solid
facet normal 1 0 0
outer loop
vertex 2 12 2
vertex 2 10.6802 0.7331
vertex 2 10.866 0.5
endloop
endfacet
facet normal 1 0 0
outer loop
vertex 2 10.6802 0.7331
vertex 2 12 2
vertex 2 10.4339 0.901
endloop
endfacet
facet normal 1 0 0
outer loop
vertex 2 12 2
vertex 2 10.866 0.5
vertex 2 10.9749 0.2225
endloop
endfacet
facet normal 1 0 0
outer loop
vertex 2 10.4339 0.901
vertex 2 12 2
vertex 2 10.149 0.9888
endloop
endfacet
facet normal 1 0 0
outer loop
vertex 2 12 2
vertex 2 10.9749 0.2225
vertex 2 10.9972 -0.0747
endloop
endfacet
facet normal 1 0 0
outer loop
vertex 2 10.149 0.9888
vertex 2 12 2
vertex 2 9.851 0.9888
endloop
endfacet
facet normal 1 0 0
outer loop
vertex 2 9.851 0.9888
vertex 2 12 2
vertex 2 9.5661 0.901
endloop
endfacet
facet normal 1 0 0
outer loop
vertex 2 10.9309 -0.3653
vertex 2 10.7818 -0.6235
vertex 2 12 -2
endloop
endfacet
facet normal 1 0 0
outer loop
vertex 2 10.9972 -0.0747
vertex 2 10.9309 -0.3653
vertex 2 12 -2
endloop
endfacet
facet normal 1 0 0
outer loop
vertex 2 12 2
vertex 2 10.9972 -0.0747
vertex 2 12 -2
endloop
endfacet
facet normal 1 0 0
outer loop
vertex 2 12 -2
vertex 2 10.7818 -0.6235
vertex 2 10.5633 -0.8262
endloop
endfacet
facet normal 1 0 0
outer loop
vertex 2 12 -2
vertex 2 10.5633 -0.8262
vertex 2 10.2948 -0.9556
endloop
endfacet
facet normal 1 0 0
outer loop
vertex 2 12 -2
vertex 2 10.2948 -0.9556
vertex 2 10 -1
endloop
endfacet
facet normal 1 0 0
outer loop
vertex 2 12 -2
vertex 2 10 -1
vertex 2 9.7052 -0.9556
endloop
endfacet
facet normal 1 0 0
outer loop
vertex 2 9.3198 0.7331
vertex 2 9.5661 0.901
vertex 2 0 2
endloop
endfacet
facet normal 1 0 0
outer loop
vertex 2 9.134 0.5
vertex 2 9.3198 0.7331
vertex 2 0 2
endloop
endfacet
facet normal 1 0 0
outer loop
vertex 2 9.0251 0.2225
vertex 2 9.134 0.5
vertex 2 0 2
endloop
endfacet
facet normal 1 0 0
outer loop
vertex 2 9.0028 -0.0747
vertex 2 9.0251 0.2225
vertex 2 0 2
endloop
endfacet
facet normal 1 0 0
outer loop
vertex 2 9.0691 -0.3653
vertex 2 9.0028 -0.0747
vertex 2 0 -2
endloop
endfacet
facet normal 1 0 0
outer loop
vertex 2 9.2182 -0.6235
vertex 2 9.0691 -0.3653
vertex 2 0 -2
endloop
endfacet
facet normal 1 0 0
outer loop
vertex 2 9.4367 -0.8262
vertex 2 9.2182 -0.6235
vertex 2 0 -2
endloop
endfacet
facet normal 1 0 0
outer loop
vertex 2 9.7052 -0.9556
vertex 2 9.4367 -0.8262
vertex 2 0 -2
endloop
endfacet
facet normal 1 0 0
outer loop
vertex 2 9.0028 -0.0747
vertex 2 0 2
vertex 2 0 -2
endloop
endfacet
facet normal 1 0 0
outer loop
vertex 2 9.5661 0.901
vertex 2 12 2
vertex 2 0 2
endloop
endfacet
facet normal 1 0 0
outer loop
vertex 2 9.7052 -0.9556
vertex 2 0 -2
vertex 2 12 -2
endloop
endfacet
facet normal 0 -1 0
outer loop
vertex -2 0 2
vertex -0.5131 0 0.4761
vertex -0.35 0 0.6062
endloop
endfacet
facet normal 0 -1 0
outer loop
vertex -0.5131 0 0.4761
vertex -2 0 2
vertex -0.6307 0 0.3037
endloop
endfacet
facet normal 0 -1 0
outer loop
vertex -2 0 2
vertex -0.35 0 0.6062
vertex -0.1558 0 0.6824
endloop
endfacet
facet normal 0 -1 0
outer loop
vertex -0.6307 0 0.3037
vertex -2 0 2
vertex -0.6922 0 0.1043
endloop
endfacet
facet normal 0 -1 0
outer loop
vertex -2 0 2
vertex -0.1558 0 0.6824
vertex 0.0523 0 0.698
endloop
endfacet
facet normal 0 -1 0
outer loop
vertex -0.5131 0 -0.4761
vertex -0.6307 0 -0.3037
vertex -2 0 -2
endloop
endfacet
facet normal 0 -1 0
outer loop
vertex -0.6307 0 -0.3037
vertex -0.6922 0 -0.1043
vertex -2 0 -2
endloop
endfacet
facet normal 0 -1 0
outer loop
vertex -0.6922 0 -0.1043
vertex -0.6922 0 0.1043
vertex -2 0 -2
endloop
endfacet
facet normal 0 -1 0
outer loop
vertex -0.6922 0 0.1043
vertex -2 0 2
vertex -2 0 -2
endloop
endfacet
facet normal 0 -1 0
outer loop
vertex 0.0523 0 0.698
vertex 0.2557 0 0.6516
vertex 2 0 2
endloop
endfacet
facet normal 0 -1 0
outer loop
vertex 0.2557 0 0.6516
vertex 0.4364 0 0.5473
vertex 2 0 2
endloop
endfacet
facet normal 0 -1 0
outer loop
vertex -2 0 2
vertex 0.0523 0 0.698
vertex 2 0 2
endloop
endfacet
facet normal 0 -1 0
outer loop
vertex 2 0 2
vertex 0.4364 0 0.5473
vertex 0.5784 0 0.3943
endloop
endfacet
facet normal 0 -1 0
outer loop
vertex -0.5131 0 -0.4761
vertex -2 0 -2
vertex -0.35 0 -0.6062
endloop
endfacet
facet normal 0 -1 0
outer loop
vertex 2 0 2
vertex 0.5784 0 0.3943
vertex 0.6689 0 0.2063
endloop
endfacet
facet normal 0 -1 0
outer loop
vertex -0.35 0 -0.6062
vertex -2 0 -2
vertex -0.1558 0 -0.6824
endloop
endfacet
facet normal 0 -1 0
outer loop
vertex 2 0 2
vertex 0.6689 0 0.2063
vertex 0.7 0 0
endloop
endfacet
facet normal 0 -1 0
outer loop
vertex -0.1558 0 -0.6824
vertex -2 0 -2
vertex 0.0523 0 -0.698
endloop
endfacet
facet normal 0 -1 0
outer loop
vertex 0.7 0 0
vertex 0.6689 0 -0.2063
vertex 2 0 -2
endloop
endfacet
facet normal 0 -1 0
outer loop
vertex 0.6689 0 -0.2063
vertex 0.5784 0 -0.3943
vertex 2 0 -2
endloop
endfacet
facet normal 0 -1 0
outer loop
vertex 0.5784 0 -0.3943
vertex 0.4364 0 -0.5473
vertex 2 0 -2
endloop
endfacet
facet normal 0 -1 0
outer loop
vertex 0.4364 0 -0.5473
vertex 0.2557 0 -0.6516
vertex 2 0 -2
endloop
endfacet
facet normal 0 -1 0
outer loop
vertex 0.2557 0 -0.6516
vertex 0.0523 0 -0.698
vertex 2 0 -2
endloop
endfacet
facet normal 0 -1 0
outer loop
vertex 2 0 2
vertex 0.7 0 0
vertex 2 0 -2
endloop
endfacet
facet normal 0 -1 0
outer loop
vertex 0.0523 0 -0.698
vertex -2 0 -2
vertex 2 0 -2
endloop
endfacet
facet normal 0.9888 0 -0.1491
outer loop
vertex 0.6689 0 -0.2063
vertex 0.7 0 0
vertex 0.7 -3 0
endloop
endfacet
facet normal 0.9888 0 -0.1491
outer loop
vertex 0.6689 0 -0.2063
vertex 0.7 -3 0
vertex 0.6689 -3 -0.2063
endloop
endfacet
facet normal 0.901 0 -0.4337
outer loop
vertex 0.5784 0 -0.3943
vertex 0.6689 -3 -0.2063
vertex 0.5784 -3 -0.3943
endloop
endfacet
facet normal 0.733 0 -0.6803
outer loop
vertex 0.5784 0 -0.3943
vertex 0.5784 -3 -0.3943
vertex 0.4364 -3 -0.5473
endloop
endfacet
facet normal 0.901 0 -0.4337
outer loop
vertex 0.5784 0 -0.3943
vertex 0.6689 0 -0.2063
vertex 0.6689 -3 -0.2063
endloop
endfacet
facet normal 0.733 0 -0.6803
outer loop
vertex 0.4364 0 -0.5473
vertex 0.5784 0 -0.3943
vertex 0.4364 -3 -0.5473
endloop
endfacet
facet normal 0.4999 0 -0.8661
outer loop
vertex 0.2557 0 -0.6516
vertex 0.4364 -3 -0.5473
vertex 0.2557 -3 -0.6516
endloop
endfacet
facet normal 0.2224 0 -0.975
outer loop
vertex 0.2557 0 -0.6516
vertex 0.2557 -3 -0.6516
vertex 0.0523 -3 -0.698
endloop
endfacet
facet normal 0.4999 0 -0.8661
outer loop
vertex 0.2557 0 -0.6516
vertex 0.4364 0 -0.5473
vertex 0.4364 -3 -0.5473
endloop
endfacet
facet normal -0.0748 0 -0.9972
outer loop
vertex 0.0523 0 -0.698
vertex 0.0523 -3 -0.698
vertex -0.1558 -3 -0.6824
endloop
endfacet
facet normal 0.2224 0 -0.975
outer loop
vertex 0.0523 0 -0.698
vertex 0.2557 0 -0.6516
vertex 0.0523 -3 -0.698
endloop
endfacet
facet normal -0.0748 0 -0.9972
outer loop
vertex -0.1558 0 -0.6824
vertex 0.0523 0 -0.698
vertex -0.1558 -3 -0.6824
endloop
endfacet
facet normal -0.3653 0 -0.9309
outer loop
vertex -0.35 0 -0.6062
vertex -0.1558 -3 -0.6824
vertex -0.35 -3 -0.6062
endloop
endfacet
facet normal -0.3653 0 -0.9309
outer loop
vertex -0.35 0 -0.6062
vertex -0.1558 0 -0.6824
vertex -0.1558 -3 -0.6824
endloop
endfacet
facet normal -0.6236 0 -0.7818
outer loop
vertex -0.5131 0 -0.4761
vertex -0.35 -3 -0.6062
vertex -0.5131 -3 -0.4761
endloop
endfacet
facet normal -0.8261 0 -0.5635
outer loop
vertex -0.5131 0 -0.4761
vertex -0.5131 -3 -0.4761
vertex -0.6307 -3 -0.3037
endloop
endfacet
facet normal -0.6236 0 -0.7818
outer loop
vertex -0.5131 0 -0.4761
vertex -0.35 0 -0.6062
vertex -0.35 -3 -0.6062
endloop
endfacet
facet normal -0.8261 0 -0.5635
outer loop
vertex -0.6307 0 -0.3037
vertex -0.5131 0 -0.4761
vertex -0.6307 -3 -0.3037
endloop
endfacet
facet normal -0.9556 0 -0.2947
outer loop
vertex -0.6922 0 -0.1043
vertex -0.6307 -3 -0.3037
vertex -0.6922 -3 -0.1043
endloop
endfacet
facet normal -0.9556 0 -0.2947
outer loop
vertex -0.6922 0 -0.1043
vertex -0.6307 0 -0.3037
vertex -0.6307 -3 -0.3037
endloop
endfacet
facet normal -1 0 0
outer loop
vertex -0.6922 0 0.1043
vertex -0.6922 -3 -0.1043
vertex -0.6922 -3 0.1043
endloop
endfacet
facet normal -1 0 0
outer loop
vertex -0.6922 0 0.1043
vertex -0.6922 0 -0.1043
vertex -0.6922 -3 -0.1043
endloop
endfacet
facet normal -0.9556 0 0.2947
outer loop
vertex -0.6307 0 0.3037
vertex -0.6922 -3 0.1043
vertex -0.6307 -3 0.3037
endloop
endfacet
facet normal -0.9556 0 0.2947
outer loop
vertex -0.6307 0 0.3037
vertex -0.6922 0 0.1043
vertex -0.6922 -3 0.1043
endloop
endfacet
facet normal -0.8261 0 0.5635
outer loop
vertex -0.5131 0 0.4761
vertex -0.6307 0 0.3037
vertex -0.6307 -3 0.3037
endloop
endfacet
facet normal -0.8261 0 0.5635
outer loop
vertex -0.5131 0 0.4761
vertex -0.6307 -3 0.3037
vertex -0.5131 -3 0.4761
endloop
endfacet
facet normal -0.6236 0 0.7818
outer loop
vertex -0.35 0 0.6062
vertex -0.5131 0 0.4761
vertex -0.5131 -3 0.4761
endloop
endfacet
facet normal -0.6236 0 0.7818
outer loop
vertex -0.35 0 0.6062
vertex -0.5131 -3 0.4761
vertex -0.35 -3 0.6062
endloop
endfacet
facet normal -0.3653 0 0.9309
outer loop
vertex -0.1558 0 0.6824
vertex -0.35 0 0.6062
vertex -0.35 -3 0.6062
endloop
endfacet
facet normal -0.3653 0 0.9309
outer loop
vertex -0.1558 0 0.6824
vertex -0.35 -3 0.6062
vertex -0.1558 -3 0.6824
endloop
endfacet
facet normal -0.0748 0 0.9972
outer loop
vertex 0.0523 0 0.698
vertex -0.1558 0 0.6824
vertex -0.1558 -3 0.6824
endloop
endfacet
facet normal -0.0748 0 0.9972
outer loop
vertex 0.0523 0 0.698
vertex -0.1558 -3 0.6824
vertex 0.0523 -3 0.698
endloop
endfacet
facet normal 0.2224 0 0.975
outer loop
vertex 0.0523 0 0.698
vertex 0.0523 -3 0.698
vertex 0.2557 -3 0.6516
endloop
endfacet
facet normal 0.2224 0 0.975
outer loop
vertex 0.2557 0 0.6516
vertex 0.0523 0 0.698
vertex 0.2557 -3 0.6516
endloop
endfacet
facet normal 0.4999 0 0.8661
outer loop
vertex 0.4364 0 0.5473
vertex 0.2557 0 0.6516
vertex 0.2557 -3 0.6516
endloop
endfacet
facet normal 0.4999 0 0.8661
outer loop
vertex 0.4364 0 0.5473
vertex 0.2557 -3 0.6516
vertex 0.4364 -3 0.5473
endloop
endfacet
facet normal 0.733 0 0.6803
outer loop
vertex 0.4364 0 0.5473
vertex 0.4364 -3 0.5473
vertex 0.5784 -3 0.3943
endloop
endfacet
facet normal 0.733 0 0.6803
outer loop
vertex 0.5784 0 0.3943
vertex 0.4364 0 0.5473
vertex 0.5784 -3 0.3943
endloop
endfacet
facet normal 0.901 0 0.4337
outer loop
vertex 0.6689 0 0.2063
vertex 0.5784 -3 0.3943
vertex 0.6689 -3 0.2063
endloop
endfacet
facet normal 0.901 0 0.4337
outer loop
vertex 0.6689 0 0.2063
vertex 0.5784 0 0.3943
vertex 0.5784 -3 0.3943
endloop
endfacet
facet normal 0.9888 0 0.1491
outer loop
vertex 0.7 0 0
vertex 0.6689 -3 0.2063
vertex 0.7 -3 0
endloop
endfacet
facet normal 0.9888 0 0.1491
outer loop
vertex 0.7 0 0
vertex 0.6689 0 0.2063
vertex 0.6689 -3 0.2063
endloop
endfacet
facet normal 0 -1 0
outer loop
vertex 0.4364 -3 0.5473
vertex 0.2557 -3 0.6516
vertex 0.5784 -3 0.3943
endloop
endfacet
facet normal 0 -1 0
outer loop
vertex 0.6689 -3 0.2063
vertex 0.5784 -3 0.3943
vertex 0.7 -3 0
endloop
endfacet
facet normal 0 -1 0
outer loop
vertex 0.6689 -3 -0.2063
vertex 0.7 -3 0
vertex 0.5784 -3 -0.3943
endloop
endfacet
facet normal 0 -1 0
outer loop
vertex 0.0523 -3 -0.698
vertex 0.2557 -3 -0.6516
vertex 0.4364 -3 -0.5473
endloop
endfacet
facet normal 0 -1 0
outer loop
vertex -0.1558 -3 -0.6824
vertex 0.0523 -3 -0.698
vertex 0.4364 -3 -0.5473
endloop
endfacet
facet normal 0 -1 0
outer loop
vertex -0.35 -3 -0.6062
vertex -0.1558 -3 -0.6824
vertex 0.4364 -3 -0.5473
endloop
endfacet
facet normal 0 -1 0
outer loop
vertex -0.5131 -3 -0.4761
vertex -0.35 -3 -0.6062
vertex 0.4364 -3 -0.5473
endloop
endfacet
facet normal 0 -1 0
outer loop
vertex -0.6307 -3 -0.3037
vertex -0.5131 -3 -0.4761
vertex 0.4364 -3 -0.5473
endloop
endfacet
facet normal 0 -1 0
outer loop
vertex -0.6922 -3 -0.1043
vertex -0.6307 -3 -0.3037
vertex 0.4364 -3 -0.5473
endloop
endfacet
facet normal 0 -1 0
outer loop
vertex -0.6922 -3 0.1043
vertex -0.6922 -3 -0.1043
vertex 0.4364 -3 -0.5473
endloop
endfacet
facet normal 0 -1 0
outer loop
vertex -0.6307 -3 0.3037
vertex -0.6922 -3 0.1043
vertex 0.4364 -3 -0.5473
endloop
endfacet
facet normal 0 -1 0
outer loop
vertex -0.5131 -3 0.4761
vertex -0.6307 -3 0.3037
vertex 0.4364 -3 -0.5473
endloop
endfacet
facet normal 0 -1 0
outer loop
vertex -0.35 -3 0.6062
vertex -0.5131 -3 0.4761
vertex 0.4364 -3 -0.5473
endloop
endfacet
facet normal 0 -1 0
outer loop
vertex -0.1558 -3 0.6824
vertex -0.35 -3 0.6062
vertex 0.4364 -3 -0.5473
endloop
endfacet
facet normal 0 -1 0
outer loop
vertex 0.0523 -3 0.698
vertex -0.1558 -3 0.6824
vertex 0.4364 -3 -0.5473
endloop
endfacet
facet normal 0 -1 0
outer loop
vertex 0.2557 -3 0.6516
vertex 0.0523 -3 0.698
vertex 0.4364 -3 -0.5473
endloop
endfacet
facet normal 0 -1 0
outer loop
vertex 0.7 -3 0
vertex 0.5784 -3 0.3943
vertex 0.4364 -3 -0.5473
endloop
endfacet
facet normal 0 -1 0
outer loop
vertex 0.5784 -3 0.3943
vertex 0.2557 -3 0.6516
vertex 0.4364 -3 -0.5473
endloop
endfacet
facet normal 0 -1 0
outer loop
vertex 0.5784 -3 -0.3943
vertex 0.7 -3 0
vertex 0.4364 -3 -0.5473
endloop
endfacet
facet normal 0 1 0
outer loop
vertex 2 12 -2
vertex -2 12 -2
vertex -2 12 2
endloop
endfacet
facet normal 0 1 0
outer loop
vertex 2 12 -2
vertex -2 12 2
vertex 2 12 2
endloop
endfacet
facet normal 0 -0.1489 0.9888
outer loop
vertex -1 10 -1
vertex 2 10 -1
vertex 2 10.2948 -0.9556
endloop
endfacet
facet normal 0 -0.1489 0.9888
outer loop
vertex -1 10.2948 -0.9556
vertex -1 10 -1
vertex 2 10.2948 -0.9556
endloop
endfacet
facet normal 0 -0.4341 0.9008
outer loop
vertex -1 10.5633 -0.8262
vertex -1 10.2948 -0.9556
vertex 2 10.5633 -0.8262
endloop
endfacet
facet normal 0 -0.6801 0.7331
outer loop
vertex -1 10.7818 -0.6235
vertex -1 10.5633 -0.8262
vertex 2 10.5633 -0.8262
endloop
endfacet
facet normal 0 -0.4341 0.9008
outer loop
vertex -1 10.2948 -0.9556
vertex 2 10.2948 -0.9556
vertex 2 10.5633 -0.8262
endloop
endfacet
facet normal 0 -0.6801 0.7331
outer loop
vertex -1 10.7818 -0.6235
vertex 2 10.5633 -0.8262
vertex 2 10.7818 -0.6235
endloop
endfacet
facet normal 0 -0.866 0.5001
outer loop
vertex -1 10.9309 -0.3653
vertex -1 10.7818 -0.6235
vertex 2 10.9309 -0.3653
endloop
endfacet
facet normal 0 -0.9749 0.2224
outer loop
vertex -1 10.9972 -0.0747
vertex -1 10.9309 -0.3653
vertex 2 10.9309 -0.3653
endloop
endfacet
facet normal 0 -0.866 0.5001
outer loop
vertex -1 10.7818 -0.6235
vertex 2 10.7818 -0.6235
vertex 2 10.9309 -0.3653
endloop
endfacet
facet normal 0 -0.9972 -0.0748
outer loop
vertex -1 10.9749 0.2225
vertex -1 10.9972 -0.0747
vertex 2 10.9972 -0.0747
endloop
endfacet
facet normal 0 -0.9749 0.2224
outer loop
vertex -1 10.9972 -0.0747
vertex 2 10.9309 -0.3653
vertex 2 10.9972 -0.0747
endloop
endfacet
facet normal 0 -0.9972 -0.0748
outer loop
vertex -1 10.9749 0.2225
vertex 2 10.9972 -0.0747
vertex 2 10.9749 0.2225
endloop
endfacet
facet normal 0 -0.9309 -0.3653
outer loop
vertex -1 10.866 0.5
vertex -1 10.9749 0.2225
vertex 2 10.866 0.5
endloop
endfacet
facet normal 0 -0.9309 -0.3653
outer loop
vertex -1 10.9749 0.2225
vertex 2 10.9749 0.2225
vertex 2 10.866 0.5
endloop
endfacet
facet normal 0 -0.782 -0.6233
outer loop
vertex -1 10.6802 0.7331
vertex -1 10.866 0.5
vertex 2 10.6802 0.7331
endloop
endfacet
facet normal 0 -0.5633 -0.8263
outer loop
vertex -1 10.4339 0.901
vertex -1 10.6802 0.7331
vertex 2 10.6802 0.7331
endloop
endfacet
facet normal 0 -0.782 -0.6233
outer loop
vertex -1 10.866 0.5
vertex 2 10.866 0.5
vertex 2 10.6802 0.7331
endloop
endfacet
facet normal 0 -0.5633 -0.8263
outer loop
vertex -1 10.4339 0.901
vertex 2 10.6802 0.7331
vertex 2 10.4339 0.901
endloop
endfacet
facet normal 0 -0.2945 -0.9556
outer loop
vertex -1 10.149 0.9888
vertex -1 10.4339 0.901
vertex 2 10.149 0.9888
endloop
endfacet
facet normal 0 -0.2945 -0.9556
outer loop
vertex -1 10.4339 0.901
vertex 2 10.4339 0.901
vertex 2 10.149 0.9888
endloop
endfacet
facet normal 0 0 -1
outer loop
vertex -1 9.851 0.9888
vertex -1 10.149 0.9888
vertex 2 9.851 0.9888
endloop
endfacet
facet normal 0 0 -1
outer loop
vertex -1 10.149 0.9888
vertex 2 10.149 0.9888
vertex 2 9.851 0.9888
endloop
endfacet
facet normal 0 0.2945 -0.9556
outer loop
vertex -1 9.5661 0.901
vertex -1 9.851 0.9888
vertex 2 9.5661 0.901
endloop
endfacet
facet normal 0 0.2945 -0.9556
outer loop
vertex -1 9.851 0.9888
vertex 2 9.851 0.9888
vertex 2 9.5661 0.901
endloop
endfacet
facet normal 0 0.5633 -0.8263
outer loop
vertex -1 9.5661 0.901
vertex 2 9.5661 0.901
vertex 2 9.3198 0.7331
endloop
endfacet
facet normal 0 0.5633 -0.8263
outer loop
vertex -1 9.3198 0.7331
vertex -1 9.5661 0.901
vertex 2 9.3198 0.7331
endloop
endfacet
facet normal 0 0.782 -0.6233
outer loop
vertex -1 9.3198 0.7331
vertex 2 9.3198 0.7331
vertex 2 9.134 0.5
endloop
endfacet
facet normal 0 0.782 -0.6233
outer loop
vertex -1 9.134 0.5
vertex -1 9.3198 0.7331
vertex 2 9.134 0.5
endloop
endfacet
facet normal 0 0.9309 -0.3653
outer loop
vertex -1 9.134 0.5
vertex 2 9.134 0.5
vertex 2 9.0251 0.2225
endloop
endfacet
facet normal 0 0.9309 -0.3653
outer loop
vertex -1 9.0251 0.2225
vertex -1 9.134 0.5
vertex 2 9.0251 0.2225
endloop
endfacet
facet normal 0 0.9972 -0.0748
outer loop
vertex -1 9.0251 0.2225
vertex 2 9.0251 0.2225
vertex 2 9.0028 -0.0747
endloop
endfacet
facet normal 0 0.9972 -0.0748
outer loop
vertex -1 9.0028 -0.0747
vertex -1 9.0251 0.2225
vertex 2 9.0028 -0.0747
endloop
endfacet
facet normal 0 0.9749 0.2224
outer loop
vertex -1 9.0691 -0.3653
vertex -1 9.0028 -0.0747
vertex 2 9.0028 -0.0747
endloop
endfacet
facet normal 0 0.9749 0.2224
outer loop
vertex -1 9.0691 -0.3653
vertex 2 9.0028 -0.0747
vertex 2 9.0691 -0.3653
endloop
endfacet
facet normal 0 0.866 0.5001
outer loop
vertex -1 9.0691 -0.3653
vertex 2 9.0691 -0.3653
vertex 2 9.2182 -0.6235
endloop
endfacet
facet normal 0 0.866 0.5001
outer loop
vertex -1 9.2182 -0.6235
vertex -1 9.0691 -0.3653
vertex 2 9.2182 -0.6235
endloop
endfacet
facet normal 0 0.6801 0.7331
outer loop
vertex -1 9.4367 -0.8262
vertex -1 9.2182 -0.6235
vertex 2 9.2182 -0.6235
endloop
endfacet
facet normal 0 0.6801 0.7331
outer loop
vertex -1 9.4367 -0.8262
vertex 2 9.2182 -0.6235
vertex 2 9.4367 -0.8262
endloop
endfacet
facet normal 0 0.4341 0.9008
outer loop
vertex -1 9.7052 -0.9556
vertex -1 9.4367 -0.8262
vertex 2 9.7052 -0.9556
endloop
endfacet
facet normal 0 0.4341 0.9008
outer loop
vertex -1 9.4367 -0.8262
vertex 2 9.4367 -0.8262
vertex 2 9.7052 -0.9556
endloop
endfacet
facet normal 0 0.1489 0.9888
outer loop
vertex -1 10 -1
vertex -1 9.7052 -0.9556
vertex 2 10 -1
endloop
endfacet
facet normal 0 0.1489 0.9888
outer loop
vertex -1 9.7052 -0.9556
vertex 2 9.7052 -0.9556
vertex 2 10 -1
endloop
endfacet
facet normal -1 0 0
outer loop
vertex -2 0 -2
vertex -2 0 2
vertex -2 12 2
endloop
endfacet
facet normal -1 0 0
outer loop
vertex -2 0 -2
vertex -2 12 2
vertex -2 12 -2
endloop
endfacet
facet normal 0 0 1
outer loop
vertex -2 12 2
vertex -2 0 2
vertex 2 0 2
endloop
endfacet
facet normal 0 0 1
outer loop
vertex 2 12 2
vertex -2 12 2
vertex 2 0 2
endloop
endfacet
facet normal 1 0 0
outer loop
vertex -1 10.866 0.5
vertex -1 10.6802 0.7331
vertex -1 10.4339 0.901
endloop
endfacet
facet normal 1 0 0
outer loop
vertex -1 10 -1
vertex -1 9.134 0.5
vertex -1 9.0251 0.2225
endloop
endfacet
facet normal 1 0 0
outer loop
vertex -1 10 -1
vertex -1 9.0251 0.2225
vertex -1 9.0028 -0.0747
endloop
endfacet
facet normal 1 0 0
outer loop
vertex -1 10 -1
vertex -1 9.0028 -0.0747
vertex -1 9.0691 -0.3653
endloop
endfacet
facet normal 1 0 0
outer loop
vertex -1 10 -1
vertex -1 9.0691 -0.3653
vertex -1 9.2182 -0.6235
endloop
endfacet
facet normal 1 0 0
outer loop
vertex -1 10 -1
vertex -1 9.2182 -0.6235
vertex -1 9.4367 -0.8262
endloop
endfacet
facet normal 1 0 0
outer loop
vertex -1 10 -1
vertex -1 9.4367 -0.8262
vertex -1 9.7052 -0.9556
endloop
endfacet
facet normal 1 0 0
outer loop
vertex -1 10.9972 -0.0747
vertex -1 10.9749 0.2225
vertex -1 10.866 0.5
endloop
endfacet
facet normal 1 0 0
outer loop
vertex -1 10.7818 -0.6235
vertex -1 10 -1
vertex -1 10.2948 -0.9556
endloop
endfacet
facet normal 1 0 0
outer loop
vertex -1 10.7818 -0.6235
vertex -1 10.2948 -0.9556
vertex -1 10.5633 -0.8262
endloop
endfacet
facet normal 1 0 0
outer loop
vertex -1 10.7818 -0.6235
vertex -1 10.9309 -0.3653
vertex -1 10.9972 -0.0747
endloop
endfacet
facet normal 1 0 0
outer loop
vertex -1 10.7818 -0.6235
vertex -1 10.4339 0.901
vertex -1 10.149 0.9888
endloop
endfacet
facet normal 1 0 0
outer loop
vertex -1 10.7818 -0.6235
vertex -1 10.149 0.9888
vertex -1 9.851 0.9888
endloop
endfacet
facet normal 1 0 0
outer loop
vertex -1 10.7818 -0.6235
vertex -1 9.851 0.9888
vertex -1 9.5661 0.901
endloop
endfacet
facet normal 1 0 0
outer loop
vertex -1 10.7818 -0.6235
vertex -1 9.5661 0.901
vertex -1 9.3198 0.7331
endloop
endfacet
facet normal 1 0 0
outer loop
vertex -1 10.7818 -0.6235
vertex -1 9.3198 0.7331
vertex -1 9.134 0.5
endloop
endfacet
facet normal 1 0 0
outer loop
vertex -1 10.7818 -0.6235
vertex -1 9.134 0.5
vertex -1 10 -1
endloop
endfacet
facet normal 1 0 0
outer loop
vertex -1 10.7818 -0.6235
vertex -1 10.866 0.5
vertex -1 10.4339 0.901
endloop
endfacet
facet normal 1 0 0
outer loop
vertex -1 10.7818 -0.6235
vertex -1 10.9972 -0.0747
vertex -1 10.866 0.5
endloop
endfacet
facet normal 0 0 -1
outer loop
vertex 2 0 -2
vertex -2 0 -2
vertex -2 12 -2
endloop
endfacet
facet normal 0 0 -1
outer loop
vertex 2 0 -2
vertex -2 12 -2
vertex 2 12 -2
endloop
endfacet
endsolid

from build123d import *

# Parameters (mm, degrees)
SKETCH2_W           = 4
SKETCH2_H           = 4
BOSS_EXTRUDE1_DEPTH = 12
SKETCH3_R           = 0.7
BOSS_EXTRUDE2_DEPTH = 3
SKETCH4_R           = 1
CUT_EXTRUDE1_DEPTH  = 3


with BuildPart() as part:
    # Sketch2 → Boss-Extrude1 (new body)
    with BuildSketch(Plane(origin=(0, 0, 0), x_dir=(1, 0, 0), z_dir=(0, 1, 0))):
        Rectangle(SKETCH2_W, SKETCH2_H)
    extrude(amount=BOSS_EXTRUDE1_DEPTH)

    # Sketch3 → Boss-Extrude2 (add)
    with BuildSketch(Plane(origin=(0, 0, 0), x_dir=(1, 0, 0), z_dir=(0, 1, 0))):
        Circle(SKETCH3_R)
    extrude(amount=-BOSS_EXTRUDE2_DEPTH)

    # Sketch4 → Cut-Extrude1 (cut)
    with BuildSketch(Plane(origin=(2, 0, 0), x_dir=(0, 0, -1), z_dir=(1, 0, 0))):
        with Locations((0, 10)):
            Circle(SKETCH4_R)
    extrude(amount=-CUT_EXTRUDE1_DEPTH, mode=Mode.SUBTRACT)


solid = part.part
